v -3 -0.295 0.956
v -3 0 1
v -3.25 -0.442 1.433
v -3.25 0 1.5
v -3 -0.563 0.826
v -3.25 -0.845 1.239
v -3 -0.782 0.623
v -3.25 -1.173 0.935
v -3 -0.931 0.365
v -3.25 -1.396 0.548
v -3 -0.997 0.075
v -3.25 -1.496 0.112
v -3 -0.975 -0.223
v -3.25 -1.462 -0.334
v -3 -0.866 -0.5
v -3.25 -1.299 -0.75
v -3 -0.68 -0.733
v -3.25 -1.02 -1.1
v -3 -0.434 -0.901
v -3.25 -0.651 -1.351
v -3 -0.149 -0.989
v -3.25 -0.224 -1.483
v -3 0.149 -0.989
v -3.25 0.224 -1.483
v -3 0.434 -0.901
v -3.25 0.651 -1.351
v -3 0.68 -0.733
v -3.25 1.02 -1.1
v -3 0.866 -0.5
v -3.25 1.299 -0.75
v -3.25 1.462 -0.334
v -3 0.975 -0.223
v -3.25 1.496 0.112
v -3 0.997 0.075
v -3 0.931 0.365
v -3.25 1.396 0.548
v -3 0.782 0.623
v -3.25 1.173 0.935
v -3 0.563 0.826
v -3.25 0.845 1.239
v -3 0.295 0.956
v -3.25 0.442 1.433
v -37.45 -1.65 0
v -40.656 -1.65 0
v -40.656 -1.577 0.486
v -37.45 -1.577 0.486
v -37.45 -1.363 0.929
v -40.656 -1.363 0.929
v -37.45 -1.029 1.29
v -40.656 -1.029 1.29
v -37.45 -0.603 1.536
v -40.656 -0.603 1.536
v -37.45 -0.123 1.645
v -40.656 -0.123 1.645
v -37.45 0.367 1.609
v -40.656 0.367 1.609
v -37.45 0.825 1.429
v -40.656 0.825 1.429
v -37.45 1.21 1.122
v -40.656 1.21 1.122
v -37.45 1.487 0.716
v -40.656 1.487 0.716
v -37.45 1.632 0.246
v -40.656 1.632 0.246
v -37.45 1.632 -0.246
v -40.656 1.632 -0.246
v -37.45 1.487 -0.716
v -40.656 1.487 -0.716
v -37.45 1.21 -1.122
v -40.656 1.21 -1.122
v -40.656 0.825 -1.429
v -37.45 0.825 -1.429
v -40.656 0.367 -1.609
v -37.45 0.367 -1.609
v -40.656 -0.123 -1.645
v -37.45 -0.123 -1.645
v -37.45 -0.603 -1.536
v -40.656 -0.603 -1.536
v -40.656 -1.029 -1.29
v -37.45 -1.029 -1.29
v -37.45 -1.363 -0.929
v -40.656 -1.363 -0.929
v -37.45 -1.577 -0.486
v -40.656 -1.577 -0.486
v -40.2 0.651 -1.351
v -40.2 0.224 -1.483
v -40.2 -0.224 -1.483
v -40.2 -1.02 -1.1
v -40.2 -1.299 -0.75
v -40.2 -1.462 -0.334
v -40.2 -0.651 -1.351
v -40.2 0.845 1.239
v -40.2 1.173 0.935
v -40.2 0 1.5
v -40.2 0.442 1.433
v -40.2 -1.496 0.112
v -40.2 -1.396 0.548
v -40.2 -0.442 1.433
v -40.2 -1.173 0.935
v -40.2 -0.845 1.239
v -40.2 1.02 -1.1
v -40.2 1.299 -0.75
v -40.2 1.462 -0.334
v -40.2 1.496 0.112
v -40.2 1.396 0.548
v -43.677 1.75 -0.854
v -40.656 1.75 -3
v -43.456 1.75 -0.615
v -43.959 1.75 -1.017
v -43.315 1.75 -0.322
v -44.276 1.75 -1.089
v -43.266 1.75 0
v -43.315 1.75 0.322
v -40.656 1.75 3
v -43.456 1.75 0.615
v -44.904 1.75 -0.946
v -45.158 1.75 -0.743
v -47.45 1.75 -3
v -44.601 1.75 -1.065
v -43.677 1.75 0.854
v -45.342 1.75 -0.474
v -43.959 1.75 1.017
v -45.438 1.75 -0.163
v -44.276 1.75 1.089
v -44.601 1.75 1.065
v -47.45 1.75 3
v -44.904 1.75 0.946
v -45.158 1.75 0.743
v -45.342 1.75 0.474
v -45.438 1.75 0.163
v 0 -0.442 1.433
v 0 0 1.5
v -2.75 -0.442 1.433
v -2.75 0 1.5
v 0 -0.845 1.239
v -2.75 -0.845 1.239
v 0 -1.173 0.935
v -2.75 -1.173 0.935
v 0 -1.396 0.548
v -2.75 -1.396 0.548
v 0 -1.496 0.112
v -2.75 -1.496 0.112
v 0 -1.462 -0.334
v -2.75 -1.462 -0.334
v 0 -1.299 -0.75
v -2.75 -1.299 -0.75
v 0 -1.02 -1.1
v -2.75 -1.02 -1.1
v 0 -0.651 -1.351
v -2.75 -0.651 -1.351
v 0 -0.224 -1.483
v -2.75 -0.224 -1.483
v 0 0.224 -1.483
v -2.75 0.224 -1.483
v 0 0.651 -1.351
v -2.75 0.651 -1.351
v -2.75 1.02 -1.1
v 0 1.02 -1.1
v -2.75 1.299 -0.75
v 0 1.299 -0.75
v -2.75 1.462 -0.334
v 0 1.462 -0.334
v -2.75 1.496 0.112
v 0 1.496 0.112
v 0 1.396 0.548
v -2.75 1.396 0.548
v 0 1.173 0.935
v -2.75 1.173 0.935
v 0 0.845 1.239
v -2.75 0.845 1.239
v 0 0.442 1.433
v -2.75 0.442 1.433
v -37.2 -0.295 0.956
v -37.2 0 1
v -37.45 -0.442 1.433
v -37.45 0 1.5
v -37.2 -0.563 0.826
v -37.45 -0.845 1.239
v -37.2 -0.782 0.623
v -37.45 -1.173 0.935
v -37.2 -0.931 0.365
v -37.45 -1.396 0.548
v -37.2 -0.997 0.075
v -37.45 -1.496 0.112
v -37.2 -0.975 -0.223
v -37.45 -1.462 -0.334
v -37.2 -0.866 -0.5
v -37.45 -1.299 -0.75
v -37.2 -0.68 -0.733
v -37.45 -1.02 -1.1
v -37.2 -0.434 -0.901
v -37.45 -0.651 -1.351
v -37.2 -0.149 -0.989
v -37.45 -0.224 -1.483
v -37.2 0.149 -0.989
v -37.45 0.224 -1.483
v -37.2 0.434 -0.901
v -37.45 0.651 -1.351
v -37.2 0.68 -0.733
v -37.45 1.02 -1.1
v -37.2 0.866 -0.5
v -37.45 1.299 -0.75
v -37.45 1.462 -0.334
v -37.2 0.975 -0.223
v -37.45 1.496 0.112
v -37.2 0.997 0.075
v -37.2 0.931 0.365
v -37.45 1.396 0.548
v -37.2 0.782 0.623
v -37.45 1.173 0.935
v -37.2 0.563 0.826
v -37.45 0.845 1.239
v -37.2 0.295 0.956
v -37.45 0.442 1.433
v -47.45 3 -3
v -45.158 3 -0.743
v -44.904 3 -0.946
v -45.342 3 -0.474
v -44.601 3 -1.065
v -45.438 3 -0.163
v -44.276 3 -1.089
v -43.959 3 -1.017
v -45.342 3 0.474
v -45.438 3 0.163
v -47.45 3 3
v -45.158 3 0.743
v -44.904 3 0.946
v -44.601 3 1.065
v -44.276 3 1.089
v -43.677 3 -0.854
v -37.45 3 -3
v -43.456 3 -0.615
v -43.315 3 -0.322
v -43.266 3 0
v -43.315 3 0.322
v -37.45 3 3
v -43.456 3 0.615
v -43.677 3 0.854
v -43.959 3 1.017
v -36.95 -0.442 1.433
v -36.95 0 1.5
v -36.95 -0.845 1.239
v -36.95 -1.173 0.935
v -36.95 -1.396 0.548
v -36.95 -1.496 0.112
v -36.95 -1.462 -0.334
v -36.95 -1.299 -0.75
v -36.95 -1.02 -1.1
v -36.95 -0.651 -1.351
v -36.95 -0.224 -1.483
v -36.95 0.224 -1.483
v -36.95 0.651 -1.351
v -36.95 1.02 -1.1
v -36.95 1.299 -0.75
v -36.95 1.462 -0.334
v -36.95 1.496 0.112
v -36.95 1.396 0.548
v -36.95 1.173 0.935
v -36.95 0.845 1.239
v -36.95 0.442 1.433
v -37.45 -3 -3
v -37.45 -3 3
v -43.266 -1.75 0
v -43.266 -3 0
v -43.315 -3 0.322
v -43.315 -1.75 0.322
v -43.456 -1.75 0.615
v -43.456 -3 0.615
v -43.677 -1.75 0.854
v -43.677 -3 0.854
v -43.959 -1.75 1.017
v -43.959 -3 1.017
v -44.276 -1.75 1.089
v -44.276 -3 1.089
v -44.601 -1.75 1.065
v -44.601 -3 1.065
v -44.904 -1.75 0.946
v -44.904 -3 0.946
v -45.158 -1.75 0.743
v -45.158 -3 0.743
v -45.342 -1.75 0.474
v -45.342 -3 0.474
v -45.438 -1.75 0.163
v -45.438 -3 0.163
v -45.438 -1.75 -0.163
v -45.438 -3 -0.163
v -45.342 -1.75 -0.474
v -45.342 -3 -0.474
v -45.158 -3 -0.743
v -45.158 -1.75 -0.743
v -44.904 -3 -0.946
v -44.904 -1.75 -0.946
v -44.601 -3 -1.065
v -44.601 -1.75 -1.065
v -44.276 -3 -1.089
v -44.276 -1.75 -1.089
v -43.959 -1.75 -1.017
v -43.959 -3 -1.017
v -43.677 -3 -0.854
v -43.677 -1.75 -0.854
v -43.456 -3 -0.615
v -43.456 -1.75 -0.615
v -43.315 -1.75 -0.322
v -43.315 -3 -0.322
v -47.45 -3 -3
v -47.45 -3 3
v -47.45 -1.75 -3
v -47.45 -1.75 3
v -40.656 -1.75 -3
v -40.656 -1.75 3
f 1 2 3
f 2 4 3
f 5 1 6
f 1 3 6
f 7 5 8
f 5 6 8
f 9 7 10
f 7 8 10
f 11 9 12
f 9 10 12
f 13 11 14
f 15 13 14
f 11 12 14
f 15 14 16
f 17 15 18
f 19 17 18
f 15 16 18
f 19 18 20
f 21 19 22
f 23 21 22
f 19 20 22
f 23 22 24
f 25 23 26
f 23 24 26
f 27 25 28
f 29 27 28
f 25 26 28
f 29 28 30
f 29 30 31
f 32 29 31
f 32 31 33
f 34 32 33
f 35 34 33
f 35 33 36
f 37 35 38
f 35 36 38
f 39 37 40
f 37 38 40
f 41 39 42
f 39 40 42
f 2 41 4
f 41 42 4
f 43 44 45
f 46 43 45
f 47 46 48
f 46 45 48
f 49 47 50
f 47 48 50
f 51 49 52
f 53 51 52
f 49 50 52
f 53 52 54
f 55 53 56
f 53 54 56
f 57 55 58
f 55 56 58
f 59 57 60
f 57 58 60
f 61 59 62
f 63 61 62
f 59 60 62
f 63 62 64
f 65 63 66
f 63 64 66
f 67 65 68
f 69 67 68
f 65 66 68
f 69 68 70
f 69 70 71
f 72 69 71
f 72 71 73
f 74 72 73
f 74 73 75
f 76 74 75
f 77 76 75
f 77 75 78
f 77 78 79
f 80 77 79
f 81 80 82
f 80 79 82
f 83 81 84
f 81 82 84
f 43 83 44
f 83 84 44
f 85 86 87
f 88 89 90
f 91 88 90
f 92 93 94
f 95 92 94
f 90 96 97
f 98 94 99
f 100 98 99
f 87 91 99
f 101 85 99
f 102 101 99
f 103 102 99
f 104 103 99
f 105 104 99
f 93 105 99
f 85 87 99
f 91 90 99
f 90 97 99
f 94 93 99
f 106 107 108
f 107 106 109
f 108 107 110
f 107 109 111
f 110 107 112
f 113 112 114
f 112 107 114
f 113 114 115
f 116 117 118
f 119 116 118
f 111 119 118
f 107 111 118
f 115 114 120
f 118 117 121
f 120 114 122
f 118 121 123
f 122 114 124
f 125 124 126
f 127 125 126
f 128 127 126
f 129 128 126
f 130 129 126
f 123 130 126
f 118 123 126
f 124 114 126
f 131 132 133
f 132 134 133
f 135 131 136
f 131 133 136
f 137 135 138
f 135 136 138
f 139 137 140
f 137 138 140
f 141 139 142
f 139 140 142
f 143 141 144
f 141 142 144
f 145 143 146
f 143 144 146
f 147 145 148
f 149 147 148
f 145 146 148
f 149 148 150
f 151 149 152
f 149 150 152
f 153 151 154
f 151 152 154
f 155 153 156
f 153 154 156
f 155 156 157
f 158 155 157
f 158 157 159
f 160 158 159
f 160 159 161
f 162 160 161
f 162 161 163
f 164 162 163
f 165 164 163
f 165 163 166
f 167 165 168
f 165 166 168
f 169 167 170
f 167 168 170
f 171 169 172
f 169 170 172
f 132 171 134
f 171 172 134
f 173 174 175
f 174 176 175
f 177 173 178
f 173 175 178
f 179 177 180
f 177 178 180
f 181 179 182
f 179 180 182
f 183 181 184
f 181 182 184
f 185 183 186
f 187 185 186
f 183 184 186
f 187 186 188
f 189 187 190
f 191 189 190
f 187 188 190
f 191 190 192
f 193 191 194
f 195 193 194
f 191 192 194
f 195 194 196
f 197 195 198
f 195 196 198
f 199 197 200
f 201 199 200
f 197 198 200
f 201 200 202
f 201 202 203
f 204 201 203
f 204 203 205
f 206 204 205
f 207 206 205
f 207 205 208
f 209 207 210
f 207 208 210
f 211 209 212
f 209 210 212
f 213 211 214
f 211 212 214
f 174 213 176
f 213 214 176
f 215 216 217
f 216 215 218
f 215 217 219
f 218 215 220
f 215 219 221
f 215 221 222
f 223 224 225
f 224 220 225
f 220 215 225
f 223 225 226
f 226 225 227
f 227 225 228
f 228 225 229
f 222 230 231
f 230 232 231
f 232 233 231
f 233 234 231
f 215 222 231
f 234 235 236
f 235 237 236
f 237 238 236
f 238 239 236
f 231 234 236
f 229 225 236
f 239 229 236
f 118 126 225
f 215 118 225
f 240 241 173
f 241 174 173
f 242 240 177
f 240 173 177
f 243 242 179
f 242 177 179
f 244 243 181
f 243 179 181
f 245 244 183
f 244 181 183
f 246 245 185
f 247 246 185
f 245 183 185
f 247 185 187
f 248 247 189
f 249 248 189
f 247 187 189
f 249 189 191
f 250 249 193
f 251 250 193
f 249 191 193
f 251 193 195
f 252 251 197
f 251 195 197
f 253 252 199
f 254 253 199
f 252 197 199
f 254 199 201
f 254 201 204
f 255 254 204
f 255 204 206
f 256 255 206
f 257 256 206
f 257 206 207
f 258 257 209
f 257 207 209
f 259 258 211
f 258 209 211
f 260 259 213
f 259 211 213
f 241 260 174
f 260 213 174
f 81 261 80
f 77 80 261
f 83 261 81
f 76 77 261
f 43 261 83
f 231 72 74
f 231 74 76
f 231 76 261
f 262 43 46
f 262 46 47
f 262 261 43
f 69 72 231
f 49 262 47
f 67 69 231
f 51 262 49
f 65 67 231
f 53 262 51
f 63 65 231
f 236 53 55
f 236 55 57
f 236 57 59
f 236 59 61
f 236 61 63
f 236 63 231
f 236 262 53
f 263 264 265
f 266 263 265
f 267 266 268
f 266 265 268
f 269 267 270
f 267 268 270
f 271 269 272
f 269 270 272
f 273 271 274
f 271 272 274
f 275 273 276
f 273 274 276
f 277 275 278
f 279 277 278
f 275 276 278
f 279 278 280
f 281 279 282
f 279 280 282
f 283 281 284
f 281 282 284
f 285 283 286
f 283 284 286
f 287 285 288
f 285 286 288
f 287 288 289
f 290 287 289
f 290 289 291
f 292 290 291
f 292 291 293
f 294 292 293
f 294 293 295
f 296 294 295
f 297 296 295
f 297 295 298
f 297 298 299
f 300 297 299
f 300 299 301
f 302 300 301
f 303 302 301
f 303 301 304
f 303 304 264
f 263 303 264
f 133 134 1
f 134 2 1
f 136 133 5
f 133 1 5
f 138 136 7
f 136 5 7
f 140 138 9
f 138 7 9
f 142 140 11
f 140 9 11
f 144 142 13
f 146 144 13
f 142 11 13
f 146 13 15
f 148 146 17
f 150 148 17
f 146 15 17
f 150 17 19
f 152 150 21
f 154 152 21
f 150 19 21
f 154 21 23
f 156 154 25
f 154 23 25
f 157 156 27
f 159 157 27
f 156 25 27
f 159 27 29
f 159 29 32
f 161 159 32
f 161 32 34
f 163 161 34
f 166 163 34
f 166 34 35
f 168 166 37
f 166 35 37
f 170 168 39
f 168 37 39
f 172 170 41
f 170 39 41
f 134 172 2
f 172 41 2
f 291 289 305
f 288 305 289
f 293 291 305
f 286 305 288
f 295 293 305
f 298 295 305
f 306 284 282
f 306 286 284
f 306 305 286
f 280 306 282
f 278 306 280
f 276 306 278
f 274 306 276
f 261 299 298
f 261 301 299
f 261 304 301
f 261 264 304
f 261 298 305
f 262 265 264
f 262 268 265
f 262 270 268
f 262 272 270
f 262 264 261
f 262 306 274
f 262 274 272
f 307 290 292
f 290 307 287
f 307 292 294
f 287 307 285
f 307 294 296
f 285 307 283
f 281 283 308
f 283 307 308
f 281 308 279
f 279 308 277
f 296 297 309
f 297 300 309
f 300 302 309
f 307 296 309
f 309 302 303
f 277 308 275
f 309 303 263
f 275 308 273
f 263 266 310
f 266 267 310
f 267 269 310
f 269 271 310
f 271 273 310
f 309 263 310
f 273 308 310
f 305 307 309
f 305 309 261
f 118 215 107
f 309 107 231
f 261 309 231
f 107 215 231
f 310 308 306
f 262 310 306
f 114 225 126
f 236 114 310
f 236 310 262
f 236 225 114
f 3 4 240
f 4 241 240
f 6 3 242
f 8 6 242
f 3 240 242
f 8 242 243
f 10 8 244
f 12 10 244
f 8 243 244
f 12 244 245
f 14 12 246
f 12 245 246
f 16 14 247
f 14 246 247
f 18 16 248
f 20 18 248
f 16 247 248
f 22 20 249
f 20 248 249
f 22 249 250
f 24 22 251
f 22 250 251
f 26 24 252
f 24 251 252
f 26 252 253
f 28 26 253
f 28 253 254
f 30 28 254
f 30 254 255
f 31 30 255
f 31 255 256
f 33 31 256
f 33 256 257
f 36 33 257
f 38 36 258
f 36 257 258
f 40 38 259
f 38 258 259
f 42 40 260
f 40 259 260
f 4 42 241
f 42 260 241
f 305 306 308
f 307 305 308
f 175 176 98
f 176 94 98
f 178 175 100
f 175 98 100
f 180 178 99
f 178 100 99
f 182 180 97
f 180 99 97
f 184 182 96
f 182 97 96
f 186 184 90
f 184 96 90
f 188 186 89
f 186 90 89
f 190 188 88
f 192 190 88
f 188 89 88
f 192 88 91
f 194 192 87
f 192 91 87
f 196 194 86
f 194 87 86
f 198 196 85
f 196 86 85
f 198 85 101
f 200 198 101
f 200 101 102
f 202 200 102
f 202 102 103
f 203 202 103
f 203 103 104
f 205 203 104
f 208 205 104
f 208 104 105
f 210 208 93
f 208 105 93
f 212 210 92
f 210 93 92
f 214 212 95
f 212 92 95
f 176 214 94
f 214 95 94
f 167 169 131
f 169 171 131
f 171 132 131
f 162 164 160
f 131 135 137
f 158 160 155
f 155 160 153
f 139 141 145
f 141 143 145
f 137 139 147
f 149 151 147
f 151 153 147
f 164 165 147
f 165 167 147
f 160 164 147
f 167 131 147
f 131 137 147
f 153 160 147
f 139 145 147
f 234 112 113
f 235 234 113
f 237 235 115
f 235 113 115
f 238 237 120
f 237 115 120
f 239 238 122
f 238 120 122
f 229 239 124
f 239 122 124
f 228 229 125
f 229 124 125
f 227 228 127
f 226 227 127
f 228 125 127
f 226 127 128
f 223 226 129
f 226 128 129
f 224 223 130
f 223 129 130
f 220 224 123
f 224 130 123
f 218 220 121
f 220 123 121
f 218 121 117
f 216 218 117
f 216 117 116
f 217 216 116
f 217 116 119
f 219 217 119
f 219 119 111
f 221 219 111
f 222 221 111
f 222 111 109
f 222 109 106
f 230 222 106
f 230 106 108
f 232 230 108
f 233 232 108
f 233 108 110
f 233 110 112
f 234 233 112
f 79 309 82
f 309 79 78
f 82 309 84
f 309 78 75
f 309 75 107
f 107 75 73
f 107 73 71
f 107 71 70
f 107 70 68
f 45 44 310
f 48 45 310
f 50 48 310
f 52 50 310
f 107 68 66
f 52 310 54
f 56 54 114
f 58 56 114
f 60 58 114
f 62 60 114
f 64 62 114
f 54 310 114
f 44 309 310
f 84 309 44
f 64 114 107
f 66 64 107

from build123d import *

# Parameters (mm, degrees)
F2_W     = 10
F2_H     = 6
F3_DEPTH = 3
F5_D     = 3.3
F5_DEPTH = 4
F5_TIP   = 0.9914200214
F6_R     = 1.092
F7_DEPTH = 6.001
F9_DEPTH = 6.001


with BuildPart() as f1:
    # F0 (on Front) → F1 (revolve)
    with BuildSketch(Plane.XZ):
        Polygon((-37.45, 1.5), (-40.2, 1.5), (-40.2, 0), (0, 0), (0, 1.5), (-2.75, 1.5), (-3, 1), (-3.25, 1.5), (-36.95, 1.5), (-37.2, 1), align=None)
    revolve(axis=Axis((-20.1, 0, 0), (1, 0, 0)))


with BuildPart() as f3:
    # F2 (on Top) → F3 (new body, symmetric)
    with BuildSketch(Plane.XY):
        with Locations((-42.45, 0)):
            Rectangle(F2_W, F2_H)
    extrude(amount=F3_DEPTH, both=True)

    # F5
    with Locations(Plane.YZ.offset(-37.45)):
        with Locations((0, 0)):
            Hole(F5_D / 2, depth=F5_DEPTH)
            with Locations((0, 0, -(F5_DEPTH + F5_TIP / 2))):  # 118° drill point
                Cone(0, F5_D / 2, F5_TIP, mode=Mode.SUBTRACT)

    # F6 (on face) → F7 (cut, through all)
    with BuildSketch(Plane.XZ.offset(3)):
        with Locations((-44.358, 0)):
            Circle(F6_R)
    extrude(amount=-F7_DEPTH, mode=Mode.SUBTRACT)

    # F8 (on face) → F9 (cut, through all)
    with BuildSketch(Plane.XY.offset(3)):
        Polygon((-40.6556032121, 1.75), (-47.45, 1.75), (-47.45, 0), (-47.45, -1.75), (-40.6556032121, -1.75), align=None)
    extrude(amount=-F9_DEPTH, mode=Mode.SUBTRACT)


solid = Compound([f1.part, f3.part])
